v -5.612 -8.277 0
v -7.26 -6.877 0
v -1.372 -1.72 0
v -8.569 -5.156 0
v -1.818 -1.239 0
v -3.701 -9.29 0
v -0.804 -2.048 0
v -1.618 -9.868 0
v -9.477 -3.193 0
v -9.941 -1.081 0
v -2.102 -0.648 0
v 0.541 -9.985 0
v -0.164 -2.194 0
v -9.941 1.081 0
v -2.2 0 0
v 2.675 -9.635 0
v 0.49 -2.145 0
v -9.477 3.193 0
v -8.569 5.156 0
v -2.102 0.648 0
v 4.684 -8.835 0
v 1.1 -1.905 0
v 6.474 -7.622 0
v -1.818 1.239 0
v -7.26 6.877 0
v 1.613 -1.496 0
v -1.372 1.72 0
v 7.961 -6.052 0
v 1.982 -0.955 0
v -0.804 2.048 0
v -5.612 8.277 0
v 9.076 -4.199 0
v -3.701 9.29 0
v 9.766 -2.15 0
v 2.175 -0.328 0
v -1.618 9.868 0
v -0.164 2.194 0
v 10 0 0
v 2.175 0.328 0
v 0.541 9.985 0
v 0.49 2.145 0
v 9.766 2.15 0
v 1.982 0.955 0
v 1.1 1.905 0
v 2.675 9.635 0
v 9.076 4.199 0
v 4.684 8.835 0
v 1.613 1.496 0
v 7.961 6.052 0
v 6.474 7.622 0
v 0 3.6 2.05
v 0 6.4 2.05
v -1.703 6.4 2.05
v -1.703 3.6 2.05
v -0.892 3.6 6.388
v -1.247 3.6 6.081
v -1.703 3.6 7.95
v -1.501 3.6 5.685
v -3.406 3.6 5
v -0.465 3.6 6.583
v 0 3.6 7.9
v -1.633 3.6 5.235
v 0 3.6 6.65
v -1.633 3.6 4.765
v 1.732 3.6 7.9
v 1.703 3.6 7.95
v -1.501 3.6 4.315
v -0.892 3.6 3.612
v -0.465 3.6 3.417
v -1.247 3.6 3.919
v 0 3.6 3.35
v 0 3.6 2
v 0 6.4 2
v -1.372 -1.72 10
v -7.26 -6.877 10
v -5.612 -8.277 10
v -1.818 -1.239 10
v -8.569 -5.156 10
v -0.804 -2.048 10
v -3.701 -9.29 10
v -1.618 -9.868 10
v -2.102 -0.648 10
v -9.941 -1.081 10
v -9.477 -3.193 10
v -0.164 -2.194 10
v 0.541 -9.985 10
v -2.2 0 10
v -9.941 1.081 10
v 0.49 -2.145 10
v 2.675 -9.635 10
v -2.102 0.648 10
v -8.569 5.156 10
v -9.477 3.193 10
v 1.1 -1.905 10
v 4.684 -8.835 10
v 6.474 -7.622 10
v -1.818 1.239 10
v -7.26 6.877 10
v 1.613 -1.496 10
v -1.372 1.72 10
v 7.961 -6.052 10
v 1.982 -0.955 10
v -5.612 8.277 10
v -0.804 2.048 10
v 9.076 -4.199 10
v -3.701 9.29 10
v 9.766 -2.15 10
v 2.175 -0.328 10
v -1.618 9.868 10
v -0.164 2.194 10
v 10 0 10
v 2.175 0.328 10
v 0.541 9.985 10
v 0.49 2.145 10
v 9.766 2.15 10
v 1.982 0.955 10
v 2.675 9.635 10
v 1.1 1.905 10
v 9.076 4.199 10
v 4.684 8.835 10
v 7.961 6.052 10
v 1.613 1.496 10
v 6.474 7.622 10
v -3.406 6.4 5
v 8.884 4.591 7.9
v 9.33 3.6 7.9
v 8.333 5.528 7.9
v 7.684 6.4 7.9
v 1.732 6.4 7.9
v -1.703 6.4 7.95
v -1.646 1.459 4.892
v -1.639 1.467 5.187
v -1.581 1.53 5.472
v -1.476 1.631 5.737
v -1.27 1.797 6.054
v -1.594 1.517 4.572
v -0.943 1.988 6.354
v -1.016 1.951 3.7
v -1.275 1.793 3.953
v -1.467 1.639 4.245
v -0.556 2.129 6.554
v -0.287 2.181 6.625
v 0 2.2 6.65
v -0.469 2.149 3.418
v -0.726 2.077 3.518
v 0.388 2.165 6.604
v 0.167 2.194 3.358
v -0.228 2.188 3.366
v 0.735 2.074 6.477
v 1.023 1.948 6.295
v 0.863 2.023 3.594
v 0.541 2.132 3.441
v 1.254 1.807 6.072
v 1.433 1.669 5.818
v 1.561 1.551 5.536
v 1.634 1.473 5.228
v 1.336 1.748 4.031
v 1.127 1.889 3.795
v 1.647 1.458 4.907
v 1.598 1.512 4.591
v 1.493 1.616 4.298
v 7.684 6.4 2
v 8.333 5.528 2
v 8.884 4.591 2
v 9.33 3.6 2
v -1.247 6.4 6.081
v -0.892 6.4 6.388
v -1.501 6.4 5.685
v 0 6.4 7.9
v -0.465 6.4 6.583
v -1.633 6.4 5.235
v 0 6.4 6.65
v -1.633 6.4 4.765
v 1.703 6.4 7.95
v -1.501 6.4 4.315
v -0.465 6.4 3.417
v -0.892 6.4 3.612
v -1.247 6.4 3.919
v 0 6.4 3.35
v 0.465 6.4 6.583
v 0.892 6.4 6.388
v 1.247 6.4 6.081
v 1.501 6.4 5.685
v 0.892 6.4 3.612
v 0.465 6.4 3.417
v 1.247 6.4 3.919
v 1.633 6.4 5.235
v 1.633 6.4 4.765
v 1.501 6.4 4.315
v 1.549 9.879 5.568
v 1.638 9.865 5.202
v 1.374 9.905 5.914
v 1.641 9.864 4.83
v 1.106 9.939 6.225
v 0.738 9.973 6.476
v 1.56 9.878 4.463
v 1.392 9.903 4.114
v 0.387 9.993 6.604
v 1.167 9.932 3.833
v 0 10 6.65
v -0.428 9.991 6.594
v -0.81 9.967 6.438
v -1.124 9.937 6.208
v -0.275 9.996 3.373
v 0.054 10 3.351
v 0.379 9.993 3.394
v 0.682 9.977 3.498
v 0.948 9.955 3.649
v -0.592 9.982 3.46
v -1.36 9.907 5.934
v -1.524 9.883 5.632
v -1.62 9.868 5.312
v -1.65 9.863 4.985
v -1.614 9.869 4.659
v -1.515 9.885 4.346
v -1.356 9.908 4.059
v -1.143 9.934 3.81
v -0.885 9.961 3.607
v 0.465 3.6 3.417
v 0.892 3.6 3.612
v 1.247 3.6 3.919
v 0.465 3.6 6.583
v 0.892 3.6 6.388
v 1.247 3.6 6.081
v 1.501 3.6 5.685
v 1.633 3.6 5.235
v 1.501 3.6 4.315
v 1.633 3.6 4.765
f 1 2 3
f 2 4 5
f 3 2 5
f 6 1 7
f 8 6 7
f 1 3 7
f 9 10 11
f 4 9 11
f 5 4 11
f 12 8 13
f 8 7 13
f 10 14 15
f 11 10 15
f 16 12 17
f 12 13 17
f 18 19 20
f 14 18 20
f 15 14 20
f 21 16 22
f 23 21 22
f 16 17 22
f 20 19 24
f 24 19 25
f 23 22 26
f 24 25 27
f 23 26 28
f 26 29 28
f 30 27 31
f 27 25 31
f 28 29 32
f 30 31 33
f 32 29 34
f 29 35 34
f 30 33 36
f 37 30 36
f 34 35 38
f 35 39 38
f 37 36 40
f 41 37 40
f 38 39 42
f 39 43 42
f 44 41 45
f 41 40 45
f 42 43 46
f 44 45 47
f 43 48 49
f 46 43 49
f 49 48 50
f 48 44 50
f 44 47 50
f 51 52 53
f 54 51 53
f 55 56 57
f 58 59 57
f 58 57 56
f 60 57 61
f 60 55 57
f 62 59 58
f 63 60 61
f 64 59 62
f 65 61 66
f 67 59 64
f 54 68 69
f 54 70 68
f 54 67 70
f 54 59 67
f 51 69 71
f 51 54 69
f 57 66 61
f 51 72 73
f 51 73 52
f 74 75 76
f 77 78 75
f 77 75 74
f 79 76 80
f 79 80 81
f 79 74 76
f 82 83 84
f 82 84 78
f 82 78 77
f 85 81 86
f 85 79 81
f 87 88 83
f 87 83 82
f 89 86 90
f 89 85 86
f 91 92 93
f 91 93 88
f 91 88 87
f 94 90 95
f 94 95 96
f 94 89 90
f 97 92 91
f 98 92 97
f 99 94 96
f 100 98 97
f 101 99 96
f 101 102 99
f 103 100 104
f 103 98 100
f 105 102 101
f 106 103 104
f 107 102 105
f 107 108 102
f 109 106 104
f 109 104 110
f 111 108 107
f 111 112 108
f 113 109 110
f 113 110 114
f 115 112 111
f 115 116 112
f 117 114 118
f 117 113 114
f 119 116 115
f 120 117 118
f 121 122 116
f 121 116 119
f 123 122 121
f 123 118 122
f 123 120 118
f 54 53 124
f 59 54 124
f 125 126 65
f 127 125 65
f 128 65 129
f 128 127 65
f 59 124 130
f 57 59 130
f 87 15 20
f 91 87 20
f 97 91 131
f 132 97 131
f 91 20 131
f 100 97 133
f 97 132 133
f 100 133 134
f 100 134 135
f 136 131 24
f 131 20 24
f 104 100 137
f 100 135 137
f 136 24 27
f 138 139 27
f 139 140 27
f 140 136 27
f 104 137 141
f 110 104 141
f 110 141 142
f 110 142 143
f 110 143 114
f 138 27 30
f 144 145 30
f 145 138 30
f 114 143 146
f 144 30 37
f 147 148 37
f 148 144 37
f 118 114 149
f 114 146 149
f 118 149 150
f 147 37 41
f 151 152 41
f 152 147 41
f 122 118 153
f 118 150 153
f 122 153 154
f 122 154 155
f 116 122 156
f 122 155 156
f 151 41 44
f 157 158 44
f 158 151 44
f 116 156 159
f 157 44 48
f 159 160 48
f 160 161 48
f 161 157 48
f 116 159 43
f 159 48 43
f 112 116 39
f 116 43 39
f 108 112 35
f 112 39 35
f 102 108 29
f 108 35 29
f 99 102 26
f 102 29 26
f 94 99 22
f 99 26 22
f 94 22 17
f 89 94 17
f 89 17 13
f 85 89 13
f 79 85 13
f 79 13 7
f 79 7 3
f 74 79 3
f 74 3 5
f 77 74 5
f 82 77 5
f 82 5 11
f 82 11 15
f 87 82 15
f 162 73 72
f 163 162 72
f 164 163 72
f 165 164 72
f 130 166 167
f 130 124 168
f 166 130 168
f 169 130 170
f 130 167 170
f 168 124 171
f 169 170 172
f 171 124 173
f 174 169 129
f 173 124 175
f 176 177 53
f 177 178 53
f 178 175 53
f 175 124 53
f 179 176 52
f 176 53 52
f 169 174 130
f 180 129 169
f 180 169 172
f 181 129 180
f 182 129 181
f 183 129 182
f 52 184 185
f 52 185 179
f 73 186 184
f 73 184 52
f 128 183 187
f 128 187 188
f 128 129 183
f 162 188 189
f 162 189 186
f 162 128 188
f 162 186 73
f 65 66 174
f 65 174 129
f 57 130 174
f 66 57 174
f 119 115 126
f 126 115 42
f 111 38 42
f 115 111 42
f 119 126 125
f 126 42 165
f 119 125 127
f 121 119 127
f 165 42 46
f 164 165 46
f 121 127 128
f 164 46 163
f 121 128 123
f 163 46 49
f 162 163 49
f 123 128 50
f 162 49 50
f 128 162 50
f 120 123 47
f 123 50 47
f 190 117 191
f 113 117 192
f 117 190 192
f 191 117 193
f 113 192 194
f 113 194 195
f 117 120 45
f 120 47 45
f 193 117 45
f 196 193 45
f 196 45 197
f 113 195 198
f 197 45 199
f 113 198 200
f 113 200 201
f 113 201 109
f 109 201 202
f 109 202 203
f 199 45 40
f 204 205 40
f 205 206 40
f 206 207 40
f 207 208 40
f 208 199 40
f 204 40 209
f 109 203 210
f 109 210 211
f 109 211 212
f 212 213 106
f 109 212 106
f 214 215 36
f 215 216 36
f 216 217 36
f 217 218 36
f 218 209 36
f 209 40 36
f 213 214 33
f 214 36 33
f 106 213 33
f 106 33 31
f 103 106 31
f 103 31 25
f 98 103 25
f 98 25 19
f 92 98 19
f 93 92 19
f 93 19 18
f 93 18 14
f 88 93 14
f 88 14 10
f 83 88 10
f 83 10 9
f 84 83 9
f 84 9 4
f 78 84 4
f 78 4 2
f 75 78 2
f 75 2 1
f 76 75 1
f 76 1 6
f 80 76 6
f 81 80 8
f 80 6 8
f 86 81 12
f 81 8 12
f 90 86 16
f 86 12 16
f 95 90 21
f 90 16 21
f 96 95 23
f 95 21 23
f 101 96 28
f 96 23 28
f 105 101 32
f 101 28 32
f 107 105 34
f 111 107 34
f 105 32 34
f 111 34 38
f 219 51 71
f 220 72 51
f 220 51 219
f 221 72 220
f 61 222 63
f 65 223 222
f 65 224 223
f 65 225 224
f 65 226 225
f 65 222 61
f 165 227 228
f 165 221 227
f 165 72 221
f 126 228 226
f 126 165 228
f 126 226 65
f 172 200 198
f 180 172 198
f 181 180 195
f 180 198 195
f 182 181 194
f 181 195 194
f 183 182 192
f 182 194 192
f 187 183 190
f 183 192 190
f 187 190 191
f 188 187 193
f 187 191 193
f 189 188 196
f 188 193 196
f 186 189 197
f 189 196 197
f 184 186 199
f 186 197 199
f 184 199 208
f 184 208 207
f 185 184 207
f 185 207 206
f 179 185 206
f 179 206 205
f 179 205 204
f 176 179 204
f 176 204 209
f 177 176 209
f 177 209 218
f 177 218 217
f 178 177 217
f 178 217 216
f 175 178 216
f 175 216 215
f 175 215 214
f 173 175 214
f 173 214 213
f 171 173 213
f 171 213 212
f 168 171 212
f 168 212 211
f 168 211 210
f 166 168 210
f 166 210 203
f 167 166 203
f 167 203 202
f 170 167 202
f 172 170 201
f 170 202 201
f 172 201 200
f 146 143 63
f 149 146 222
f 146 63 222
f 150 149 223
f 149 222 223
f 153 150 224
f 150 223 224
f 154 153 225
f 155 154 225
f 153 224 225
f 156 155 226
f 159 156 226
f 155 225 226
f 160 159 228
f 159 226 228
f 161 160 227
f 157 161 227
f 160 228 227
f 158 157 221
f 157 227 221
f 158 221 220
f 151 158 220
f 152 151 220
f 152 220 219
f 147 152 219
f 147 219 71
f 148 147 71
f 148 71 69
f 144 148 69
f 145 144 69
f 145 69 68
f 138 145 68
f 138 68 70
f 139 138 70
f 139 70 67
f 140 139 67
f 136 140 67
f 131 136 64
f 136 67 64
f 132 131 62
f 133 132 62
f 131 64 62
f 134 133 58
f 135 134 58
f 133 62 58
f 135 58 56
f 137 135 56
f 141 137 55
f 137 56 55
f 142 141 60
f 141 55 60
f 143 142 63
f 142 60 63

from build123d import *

# Parameters (mm, degrees)
SKETCH_1_R          = 10
EXTRUDE_1_DEPTH     = 10
SKETCH_2_R          = 2.2
CUT_EXTRUDE_2_DEPTH = 10
CUT_EXTRUDE_3_DEPTH = 10
SKETCH_5_R          = 1.65
CUT_EXTRUDE_4_DEPTH = 10
CUT_EXTRUDE_START   = -3.6
CUT_EXTRUDE_5_DEPTH = 2.8


with BuildPart() as part:
    # Эскиз1 → Бобышка-Вытянуть1 (new body)
    with BuildSketch(Plane.XY):
        Circle(SKETCH_1_R)
    extrude(amount=EXTRUDE_1_DEPTH)

    # Эскиз2 → Вырез-Вытянуть2 (cut)
    with BuildSketch(Plane(origin=(0, 0, 0), x_dir=(-1, 0, 0), z_dir=(0, 0, -1))):
        Circle(SKETCH_2_R)
    extrude(amount=-CUT_EXTRUDE_2_DEPTH, mode=Mode.SUBTRACT)

    # Sketch 4 → Вырез-Вытянуть3 (cut)
    with BuildSketch(Plane(origin=(10, 6.4, 7.9), x_dir=(0, -0.4287444523171483, -0.9034258102397056), z_dir=(1, 0, 0))):
        Polygon((0, 0), (5.33021228, 2.529592269), (6.530696747, 0), (1.200484466, -2.529592269), align=None)
    extrude(amount=-CUT_EXTRUDE_3_DEPTH, mode=Mode.SUBTRACT)

    # Эскиз5 → Вырез-Вытянуть4 (cut)
    with BuildSketch(Plane(origin=(0, 10, 0), x_dir=(1, 0, 0), z_dir=(0, 1, 0))):
        with Locations(Location((0, -5, 0), (0, 0, 270))):
            Circle(SKETCH_5_R)
    extrude(amount=-CUT_EXTRUDE_4_DEPTH, mode=Mode.SUBTRACT)

    # Эскиз6 → Вырез-Вытянуть5 (cut)
    with BuildSketch(Plane(origin=(0, 10, 0), x_dir=(1, 0, 0), z_dir=(0, 1, 0)).offset(CUT_EXTRUDE_START)):
        Polygon((-1.703183294, -2.05), (-3.406366588, -5), (-1.703183294, -7.95), (1.703183294, -7.95), (3.406366588, -5), (1.703183294, -2.05), align=None)
    extrude(amount=-CUT_EXTRUDE_5_DEPTH, mode=Mode.SUBTRACT)


solid = part.part
